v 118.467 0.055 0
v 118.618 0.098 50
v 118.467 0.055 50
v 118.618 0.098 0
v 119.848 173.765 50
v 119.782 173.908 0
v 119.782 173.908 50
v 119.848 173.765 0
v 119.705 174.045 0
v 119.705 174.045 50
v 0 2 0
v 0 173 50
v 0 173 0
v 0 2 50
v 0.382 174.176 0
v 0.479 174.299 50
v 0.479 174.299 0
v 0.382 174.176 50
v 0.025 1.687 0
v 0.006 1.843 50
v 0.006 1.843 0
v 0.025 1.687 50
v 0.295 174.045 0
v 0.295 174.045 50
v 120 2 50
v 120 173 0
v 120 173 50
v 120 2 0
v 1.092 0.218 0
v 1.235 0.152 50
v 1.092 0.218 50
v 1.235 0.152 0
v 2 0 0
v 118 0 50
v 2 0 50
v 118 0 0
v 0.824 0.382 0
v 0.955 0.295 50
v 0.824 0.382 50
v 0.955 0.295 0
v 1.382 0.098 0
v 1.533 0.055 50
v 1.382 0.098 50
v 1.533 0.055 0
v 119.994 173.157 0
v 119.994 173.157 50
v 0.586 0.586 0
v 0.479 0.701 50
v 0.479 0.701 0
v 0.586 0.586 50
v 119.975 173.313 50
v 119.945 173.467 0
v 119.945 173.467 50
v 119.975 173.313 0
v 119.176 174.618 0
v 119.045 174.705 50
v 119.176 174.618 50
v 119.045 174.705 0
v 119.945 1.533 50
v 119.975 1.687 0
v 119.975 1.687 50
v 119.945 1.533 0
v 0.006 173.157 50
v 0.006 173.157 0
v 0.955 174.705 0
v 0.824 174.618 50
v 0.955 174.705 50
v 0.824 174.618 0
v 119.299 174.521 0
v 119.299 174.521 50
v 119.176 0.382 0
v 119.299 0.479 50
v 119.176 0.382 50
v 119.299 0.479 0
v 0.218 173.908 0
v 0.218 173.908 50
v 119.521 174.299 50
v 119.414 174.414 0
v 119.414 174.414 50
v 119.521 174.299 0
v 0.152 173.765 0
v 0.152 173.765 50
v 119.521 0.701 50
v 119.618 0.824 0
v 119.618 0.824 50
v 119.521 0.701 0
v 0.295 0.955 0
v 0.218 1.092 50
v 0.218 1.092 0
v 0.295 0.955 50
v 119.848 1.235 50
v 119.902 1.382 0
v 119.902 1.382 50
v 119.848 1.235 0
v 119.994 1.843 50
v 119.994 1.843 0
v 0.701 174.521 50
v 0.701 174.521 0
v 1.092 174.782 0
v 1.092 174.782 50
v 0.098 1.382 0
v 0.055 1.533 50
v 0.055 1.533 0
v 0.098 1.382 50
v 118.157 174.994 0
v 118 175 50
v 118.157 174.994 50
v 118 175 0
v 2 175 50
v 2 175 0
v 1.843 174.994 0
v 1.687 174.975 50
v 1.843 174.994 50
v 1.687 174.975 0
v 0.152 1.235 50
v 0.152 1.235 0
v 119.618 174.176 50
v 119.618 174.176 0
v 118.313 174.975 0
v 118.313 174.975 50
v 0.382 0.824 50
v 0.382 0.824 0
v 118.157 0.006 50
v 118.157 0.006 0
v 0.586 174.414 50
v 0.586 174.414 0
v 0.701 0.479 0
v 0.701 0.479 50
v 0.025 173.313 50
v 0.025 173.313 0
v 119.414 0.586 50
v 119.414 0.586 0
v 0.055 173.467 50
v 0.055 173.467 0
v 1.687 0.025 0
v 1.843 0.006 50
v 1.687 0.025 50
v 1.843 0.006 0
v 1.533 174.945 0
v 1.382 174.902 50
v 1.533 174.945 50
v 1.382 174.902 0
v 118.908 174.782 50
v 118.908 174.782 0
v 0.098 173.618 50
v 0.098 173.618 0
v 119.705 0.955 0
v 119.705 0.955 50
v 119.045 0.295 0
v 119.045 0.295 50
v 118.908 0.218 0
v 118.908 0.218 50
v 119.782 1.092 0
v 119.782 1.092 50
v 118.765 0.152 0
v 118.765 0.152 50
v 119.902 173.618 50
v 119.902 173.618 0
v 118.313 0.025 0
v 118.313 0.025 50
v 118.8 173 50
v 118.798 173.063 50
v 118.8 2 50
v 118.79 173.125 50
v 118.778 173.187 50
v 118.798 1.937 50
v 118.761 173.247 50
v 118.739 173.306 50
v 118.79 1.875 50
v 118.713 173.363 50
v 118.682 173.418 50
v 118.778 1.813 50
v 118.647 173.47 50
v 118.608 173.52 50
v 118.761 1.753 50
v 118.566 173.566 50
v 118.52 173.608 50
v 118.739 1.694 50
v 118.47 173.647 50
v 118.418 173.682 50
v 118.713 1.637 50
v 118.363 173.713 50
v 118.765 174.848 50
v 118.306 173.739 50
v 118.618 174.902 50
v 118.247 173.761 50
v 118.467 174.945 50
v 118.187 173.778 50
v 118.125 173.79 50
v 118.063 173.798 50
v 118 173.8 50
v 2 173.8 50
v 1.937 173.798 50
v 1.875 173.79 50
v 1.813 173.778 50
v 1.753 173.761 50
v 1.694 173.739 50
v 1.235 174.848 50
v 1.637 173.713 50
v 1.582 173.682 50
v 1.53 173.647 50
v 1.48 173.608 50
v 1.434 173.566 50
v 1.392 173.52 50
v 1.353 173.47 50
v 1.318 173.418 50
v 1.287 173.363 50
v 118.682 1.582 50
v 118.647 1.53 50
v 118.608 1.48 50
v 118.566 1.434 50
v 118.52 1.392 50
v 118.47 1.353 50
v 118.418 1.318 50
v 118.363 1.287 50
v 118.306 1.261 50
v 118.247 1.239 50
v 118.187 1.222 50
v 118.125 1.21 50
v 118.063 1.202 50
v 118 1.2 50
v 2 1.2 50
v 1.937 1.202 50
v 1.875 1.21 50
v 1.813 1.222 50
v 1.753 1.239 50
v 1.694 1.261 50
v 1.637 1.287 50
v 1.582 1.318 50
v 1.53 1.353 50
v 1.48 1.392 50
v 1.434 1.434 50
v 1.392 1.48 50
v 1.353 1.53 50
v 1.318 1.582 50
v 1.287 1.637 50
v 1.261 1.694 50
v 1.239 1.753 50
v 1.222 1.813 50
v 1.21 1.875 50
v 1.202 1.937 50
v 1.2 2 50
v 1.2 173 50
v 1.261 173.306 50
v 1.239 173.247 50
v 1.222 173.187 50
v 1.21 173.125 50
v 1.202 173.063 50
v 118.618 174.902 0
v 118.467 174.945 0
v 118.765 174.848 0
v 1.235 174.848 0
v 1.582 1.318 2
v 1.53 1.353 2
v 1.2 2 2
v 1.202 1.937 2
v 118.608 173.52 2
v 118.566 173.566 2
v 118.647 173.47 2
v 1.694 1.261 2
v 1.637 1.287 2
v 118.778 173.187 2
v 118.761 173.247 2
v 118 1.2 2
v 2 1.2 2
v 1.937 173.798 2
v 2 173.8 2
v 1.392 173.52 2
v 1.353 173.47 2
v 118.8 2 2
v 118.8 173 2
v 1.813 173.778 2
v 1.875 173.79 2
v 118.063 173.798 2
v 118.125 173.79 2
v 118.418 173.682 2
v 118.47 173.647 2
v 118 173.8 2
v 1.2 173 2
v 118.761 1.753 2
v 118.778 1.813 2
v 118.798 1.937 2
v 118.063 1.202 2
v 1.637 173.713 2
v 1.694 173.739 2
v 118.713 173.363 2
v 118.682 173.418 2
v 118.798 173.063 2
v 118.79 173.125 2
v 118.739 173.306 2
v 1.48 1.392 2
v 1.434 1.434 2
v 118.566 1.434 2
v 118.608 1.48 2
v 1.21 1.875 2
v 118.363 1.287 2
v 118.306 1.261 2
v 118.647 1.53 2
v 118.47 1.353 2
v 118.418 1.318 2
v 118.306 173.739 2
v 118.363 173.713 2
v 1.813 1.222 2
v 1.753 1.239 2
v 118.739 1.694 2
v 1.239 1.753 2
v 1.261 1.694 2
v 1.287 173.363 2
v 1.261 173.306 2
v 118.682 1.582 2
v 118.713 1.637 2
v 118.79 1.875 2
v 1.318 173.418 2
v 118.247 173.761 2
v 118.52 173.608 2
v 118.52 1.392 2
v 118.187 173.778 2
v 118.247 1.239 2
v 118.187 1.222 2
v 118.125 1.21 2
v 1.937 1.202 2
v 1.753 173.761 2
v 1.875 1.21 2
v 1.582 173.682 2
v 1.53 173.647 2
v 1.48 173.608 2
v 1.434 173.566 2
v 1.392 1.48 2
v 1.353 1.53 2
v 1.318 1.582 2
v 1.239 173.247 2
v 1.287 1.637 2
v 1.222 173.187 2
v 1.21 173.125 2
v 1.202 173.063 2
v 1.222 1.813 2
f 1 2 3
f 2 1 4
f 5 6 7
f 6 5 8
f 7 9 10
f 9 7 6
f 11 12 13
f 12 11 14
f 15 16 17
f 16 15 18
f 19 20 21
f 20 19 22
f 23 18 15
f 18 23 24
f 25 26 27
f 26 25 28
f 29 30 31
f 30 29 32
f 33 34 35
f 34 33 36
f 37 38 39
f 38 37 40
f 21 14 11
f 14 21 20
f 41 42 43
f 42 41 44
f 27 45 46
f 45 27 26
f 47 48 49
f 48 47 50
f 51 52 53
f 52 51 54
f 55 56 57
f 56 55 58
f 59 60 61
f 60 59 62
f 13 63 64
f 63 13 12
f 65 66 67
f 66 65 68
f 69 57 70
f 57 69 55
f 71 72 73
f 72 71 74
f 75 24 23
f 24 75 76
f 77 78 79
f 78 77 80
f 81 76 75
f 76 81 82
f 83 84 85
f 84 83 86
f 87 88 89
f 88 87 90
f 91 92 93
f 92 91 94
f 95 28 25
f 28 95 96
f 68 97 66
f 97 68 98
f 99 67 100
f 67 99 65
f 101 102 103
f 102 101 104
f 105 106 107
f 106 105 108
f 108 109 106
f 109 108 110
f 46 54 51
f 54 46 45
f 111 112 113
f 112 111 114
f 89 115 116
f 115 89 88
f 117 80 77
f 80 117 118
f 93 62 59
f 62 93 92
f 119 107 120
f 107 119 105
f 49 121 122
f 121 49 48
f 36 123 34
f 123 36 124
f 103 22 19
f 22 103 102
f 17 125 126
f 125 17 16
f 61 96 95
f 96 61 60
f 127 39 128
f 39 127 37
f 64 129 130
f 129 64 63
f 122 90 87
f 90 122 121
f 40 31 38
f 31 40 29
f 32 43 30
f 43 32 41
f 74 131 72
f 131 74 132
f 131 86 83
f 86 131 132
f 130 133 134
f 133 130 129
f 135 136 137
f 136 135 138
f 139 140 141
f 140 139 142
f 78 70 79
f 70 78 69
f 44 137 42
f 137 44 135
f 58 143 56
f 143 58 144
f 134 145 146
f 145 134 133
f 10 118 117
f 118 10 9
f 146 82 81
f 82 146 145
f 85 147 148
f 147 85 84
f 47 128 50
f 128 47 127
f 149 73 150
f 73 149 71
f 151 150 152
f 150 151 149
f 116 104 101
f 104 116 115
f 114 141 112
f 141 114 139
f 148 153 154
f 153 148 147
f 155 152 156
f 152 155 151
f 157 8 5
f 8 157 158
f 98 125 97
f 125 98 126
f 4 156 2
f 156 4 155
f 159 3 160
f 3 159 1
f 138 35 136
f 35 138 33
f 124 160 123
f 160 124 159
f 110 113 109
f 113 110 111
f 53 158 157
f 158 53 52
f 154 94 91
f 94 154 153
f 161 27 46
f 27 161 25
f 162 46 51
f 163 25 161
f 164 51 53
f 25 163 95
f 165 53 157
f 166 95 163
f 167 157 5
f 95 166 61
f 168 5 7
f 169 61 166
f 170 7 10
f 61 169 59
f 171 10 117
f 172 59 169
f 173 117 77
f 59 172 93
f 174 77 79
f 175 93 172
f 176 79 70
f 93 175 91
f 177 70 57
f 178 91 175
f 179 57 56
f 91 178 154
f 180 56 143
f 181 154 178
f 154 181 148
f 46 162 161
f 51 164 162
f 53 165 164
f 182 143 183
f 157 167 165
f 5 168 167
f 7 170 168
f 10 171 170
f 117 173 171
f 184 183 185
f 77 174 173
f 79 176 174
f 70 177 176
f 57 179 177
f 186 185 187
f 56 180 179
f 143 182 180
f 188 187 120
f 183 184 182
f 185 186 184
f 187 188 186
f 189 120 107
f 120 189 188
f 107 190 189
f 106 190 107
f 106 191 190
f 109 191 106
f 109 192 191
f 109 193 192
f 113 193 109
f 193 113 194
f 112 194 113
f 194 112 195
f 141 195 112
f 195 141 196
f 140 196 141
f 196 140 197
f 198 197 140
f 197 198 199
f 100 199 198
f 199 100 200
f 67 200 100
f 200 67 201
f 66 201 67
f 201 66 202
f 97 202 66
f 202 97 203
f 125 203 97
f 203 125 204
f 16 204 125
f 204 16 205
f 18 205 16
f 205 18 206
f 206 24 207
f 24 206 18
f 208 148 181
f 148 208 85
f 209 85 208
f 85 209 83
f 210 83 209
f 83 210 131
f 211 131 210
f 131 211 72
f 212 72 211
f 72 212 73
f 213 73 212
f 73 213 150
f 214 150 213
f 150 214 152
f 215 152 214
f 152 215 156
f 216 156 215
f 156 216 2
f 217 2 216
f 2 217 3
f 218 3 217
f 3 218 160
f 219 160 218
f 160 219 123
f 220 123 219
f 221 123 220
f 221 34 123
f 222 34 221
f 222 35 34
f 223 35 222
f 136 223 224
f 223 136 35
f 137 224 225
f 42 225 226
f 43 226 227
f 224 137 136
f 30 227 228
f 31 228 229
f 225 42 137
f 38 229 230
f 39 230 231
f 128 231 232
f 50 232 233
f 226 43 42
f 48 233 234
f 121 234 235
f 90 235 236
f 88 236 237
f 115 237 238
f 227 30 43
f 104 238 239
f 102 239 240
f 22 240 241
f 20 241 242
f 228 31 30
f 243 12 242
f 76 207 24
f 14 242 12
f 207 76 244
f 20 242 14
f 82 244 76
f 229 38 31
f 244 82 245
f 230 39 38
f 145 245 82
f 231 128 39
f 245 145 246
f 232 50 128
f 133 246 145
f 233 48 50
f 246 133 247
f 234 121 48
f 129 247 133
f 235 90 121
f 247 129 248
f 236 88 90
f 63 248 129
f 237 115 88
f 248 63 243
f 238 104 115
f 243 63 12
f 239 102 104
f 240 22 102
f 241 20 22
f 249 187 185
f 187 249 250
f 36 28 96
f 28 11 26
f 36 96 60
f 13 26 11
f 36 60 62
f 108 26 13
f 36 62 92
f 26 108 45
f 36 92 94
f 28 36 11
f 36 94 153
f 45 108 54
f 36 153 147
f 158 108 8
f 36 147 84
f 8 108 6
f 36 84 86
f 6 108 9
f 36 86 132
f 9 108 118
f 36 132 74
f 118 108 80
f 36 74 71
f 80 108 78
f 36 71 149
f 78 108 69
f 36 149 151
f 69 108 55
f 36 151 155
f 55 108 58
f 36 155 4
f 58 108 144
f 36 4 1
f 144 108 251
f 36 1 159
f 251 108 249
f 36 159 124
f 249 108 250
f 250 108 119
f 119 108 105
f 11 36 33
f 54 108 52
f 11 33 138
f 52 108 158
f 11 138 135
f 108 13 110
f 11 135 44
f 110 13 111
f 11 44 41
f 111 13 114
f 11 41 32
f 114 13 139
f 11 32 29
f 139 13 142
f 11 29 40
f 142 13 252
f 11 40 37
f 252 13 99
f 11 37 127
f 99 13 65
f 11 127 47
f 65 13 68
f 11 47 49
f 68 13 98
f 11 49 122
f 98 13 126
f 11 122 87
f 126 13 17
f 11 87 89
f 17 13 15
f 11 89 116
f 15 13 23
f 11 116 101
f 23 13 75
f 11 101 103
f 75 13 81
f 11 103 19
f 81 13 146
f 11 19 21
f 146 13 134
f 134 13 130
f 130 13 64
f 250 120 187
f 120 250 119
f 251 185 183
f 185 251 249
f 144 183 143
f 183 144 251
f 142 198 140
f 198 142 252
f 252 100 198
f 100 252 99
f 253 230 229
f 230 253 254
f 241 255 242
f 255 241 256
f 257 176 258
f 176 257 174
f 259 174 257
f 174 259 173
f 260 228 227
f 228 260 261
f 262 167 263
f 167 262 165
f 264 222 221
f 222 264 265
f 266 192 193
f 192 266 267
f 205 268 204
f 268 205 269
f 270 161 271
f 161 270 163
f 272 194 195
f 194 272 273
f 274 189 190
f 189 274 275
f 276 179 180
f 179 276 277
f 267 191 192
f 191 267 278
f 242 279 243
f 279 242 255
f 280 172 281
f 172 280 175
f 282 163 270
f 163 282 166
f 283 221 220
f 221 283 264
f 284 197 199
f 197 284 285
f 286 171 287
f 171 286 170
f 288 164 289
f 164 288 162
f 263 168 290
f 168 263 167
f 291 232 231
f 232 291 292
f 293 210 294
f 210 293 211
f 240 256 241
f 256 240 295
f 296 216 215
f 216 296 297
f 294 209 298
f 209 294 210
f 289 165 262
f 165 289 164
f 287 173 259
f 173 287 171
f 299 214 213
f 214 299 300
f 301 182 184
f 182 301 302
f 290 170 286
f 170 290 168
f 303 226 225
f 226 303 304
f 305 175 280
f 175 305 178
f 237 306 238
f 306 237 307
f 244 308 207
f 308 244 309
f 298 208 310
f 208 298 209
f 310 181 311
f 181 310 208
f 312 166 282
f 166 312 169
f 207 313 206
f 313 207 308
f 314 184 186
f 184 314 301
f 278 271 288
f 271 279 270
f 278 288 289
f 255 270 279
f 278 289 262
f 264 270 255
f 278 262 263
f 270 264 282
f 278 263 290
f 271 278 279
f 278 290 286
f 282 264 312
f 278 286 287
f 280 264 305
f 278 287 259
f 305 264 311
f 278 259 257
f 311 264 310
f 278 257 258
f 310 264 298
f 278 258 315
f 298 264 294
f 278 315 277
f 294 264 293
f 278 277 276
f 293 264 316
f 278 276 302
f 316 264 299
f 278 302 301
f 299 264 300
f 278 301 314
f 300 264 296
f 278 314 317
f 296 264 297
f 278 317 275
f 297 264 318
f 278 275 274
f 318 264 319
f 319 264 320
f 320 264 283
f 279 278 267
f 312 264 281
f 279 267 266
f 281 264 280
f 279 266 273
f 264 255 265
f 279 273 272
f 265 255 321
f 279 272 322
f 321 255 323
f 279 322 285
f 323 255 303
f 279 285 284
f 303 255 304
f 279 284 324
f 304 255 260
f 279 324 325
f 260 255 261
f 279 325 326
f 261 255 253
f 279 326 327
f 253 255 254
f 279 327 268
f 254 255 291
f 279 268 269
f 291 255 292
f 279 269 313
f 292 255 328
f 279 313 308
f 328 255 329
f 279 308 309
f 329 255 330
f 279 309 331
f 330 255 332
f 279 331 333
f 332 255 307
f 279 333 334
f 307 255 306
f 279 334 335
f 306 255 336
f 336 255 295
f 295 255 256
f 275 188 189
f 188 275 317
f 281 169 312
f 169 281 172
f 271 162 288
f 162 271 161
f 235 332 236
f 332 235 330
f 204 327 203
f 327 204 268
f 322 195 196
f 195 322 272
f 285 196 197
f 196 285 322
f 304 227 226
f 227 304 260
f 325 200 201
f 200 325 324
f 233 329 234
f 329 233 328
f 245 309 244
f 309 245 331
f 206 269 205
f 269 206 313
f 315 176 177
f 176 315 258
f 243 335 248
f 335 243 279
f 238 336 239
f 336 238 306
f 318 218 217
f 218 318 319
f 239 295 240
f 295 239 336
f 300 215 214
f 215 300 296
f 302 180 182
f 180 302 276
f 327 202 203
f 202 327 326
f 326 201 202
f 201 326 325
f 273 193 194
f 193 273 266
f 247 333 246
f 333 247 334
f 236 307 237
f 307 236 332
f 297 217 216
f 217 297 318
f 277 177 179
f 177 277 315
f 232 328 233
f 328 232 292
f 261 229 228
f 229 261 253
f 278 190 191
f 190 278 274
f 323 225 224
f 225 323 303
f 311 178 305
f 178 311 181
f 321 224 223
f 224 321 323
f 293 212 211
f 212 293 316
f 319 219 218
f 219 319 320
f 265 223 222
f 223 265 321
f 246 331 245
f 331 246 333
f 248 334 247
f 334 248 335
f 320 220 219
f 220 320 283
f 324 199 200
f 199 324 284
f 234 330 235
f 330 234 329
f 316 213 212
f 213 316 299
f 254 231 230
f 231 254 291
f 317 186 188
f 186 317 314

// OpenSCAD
/* [Box] */
//Box height
height=50;
//Box length
length=175;
//Box width
width=120;
//Radius for corners (minimum 2)
cornerrad=2;
//Wall thickness
outwalls=1.2;
//Box thickness for floor
thickness=2.0;

/* [Box Sections] */
//Amount of sections in the length
sectionsl=0;
//Amount of sections in the width
sectionsw=0;
//Sections height
sectionsh=14;
//Inner walls thickness
inwalls=0.8;

/* [Lid] */
//Tolerance for lid
tol=0.1; 
//Lid thickness for top
lidthickness=0.4;
//Lid height
lidheight=8;

l=length-(cornerrad*2);
w=width-(cornerrad*2);

translate([cornerrad, cornerrad, 0]){
    union(){
        difference() {
            hull() {
                h = (height/2);
                translate([0,0,h]) cylinder(h=height, r=cornerrad, $fn=80, center = true);
                translate([0,l,h]) cylinder(h=height, r=cornerrad, $fn=80, center = true);
                translate([w,l,h]) cylinder(h=height, r=cornerrad, $fn=80, center = true);
                translate([w,0,h]) cylinder(h=height, r=cornerrad, $fn=80, center = true);
            }
            hull() {
                h = (height/2) + thickness;
                translate([0,0,h]) cylinder(h=height, r=cornerrad-outwalls, $fn=80, center = true);
                translate([0,l,h]) cylinder(h=height, r=cornerrad-outwalls, $fn=80, center = true);
                translate([w,l,h]) cylinder(h=height, r=cornerrad-outwalls, $fn=80, center = true);
                translate([w,0,h]) cylinder(h=height, r=cornerrad-outwalls, $fn=80, center = true);
            }
        }
        
        if( sectionsl > 0 ){
            cutl = ((length) - (outwalls*2))/sectionsl;
            for(i = [cutl : cutl : length-cutl]) {
                translate([w/2,i+outwalls-cornerrad,sectionsh/2]) cube([width,inwalls,sectionsh], center=true);
            }
        }
        
        if( sectionsw > 0 ){
            cutw = ((width) - (outwalls*2))/sectionsw;
            for(i = [cutw : cutw : width-cutw]) {
                translate([i+outwalls-cornerrad,l/2,sectionsh/2]) cube([inwalls,length,sectionsh], center=true);
            }
        }
        
    }
/*
    translate([w + (cornerrad*2) + 6, outwalls, 0]){
        difference() {
            hull() {
                h = (lidheight/2);
                translate([0,0,h]) cylinder(h=lidheight, r=cornerrad+tol+outwalls, $fn=80, center = true);
                translate([0,l,h]) cylinder(h=lidheight, r=cornerrad+tol+outwalls, $fn=80, center = true);
                translate([w,l,h]) cylinder(h=lidheight, r=cornerrad+tol+outwalls, $fn=80, center = true);
                translate([w,0,h]) cylinder(h=lidheight, r=cornerrad+tol+outwalls, $fn=80, center = true);
            }
            
            hull() {
                h = (lidheight/2) + lidthickness;
                translate([0,0,h]) cylinder(h=lidheight, r=(cornerrad)+tol, $fn=80, center = true);
                translate([0,l,h]) cylinder(h=lidheight, r=(cornerrad)+tol, $fn=80, center = true);
                translate([w,l,h]) cylinder(h=lidheight, r=(cornerrad)+tol, $fn=80, center = true);
                translate([w,0,h]) cylinder(h=lidheight, r=(cornerrad)+tol, $fn=80, center = true);
            }
        }
    }
    */
}
